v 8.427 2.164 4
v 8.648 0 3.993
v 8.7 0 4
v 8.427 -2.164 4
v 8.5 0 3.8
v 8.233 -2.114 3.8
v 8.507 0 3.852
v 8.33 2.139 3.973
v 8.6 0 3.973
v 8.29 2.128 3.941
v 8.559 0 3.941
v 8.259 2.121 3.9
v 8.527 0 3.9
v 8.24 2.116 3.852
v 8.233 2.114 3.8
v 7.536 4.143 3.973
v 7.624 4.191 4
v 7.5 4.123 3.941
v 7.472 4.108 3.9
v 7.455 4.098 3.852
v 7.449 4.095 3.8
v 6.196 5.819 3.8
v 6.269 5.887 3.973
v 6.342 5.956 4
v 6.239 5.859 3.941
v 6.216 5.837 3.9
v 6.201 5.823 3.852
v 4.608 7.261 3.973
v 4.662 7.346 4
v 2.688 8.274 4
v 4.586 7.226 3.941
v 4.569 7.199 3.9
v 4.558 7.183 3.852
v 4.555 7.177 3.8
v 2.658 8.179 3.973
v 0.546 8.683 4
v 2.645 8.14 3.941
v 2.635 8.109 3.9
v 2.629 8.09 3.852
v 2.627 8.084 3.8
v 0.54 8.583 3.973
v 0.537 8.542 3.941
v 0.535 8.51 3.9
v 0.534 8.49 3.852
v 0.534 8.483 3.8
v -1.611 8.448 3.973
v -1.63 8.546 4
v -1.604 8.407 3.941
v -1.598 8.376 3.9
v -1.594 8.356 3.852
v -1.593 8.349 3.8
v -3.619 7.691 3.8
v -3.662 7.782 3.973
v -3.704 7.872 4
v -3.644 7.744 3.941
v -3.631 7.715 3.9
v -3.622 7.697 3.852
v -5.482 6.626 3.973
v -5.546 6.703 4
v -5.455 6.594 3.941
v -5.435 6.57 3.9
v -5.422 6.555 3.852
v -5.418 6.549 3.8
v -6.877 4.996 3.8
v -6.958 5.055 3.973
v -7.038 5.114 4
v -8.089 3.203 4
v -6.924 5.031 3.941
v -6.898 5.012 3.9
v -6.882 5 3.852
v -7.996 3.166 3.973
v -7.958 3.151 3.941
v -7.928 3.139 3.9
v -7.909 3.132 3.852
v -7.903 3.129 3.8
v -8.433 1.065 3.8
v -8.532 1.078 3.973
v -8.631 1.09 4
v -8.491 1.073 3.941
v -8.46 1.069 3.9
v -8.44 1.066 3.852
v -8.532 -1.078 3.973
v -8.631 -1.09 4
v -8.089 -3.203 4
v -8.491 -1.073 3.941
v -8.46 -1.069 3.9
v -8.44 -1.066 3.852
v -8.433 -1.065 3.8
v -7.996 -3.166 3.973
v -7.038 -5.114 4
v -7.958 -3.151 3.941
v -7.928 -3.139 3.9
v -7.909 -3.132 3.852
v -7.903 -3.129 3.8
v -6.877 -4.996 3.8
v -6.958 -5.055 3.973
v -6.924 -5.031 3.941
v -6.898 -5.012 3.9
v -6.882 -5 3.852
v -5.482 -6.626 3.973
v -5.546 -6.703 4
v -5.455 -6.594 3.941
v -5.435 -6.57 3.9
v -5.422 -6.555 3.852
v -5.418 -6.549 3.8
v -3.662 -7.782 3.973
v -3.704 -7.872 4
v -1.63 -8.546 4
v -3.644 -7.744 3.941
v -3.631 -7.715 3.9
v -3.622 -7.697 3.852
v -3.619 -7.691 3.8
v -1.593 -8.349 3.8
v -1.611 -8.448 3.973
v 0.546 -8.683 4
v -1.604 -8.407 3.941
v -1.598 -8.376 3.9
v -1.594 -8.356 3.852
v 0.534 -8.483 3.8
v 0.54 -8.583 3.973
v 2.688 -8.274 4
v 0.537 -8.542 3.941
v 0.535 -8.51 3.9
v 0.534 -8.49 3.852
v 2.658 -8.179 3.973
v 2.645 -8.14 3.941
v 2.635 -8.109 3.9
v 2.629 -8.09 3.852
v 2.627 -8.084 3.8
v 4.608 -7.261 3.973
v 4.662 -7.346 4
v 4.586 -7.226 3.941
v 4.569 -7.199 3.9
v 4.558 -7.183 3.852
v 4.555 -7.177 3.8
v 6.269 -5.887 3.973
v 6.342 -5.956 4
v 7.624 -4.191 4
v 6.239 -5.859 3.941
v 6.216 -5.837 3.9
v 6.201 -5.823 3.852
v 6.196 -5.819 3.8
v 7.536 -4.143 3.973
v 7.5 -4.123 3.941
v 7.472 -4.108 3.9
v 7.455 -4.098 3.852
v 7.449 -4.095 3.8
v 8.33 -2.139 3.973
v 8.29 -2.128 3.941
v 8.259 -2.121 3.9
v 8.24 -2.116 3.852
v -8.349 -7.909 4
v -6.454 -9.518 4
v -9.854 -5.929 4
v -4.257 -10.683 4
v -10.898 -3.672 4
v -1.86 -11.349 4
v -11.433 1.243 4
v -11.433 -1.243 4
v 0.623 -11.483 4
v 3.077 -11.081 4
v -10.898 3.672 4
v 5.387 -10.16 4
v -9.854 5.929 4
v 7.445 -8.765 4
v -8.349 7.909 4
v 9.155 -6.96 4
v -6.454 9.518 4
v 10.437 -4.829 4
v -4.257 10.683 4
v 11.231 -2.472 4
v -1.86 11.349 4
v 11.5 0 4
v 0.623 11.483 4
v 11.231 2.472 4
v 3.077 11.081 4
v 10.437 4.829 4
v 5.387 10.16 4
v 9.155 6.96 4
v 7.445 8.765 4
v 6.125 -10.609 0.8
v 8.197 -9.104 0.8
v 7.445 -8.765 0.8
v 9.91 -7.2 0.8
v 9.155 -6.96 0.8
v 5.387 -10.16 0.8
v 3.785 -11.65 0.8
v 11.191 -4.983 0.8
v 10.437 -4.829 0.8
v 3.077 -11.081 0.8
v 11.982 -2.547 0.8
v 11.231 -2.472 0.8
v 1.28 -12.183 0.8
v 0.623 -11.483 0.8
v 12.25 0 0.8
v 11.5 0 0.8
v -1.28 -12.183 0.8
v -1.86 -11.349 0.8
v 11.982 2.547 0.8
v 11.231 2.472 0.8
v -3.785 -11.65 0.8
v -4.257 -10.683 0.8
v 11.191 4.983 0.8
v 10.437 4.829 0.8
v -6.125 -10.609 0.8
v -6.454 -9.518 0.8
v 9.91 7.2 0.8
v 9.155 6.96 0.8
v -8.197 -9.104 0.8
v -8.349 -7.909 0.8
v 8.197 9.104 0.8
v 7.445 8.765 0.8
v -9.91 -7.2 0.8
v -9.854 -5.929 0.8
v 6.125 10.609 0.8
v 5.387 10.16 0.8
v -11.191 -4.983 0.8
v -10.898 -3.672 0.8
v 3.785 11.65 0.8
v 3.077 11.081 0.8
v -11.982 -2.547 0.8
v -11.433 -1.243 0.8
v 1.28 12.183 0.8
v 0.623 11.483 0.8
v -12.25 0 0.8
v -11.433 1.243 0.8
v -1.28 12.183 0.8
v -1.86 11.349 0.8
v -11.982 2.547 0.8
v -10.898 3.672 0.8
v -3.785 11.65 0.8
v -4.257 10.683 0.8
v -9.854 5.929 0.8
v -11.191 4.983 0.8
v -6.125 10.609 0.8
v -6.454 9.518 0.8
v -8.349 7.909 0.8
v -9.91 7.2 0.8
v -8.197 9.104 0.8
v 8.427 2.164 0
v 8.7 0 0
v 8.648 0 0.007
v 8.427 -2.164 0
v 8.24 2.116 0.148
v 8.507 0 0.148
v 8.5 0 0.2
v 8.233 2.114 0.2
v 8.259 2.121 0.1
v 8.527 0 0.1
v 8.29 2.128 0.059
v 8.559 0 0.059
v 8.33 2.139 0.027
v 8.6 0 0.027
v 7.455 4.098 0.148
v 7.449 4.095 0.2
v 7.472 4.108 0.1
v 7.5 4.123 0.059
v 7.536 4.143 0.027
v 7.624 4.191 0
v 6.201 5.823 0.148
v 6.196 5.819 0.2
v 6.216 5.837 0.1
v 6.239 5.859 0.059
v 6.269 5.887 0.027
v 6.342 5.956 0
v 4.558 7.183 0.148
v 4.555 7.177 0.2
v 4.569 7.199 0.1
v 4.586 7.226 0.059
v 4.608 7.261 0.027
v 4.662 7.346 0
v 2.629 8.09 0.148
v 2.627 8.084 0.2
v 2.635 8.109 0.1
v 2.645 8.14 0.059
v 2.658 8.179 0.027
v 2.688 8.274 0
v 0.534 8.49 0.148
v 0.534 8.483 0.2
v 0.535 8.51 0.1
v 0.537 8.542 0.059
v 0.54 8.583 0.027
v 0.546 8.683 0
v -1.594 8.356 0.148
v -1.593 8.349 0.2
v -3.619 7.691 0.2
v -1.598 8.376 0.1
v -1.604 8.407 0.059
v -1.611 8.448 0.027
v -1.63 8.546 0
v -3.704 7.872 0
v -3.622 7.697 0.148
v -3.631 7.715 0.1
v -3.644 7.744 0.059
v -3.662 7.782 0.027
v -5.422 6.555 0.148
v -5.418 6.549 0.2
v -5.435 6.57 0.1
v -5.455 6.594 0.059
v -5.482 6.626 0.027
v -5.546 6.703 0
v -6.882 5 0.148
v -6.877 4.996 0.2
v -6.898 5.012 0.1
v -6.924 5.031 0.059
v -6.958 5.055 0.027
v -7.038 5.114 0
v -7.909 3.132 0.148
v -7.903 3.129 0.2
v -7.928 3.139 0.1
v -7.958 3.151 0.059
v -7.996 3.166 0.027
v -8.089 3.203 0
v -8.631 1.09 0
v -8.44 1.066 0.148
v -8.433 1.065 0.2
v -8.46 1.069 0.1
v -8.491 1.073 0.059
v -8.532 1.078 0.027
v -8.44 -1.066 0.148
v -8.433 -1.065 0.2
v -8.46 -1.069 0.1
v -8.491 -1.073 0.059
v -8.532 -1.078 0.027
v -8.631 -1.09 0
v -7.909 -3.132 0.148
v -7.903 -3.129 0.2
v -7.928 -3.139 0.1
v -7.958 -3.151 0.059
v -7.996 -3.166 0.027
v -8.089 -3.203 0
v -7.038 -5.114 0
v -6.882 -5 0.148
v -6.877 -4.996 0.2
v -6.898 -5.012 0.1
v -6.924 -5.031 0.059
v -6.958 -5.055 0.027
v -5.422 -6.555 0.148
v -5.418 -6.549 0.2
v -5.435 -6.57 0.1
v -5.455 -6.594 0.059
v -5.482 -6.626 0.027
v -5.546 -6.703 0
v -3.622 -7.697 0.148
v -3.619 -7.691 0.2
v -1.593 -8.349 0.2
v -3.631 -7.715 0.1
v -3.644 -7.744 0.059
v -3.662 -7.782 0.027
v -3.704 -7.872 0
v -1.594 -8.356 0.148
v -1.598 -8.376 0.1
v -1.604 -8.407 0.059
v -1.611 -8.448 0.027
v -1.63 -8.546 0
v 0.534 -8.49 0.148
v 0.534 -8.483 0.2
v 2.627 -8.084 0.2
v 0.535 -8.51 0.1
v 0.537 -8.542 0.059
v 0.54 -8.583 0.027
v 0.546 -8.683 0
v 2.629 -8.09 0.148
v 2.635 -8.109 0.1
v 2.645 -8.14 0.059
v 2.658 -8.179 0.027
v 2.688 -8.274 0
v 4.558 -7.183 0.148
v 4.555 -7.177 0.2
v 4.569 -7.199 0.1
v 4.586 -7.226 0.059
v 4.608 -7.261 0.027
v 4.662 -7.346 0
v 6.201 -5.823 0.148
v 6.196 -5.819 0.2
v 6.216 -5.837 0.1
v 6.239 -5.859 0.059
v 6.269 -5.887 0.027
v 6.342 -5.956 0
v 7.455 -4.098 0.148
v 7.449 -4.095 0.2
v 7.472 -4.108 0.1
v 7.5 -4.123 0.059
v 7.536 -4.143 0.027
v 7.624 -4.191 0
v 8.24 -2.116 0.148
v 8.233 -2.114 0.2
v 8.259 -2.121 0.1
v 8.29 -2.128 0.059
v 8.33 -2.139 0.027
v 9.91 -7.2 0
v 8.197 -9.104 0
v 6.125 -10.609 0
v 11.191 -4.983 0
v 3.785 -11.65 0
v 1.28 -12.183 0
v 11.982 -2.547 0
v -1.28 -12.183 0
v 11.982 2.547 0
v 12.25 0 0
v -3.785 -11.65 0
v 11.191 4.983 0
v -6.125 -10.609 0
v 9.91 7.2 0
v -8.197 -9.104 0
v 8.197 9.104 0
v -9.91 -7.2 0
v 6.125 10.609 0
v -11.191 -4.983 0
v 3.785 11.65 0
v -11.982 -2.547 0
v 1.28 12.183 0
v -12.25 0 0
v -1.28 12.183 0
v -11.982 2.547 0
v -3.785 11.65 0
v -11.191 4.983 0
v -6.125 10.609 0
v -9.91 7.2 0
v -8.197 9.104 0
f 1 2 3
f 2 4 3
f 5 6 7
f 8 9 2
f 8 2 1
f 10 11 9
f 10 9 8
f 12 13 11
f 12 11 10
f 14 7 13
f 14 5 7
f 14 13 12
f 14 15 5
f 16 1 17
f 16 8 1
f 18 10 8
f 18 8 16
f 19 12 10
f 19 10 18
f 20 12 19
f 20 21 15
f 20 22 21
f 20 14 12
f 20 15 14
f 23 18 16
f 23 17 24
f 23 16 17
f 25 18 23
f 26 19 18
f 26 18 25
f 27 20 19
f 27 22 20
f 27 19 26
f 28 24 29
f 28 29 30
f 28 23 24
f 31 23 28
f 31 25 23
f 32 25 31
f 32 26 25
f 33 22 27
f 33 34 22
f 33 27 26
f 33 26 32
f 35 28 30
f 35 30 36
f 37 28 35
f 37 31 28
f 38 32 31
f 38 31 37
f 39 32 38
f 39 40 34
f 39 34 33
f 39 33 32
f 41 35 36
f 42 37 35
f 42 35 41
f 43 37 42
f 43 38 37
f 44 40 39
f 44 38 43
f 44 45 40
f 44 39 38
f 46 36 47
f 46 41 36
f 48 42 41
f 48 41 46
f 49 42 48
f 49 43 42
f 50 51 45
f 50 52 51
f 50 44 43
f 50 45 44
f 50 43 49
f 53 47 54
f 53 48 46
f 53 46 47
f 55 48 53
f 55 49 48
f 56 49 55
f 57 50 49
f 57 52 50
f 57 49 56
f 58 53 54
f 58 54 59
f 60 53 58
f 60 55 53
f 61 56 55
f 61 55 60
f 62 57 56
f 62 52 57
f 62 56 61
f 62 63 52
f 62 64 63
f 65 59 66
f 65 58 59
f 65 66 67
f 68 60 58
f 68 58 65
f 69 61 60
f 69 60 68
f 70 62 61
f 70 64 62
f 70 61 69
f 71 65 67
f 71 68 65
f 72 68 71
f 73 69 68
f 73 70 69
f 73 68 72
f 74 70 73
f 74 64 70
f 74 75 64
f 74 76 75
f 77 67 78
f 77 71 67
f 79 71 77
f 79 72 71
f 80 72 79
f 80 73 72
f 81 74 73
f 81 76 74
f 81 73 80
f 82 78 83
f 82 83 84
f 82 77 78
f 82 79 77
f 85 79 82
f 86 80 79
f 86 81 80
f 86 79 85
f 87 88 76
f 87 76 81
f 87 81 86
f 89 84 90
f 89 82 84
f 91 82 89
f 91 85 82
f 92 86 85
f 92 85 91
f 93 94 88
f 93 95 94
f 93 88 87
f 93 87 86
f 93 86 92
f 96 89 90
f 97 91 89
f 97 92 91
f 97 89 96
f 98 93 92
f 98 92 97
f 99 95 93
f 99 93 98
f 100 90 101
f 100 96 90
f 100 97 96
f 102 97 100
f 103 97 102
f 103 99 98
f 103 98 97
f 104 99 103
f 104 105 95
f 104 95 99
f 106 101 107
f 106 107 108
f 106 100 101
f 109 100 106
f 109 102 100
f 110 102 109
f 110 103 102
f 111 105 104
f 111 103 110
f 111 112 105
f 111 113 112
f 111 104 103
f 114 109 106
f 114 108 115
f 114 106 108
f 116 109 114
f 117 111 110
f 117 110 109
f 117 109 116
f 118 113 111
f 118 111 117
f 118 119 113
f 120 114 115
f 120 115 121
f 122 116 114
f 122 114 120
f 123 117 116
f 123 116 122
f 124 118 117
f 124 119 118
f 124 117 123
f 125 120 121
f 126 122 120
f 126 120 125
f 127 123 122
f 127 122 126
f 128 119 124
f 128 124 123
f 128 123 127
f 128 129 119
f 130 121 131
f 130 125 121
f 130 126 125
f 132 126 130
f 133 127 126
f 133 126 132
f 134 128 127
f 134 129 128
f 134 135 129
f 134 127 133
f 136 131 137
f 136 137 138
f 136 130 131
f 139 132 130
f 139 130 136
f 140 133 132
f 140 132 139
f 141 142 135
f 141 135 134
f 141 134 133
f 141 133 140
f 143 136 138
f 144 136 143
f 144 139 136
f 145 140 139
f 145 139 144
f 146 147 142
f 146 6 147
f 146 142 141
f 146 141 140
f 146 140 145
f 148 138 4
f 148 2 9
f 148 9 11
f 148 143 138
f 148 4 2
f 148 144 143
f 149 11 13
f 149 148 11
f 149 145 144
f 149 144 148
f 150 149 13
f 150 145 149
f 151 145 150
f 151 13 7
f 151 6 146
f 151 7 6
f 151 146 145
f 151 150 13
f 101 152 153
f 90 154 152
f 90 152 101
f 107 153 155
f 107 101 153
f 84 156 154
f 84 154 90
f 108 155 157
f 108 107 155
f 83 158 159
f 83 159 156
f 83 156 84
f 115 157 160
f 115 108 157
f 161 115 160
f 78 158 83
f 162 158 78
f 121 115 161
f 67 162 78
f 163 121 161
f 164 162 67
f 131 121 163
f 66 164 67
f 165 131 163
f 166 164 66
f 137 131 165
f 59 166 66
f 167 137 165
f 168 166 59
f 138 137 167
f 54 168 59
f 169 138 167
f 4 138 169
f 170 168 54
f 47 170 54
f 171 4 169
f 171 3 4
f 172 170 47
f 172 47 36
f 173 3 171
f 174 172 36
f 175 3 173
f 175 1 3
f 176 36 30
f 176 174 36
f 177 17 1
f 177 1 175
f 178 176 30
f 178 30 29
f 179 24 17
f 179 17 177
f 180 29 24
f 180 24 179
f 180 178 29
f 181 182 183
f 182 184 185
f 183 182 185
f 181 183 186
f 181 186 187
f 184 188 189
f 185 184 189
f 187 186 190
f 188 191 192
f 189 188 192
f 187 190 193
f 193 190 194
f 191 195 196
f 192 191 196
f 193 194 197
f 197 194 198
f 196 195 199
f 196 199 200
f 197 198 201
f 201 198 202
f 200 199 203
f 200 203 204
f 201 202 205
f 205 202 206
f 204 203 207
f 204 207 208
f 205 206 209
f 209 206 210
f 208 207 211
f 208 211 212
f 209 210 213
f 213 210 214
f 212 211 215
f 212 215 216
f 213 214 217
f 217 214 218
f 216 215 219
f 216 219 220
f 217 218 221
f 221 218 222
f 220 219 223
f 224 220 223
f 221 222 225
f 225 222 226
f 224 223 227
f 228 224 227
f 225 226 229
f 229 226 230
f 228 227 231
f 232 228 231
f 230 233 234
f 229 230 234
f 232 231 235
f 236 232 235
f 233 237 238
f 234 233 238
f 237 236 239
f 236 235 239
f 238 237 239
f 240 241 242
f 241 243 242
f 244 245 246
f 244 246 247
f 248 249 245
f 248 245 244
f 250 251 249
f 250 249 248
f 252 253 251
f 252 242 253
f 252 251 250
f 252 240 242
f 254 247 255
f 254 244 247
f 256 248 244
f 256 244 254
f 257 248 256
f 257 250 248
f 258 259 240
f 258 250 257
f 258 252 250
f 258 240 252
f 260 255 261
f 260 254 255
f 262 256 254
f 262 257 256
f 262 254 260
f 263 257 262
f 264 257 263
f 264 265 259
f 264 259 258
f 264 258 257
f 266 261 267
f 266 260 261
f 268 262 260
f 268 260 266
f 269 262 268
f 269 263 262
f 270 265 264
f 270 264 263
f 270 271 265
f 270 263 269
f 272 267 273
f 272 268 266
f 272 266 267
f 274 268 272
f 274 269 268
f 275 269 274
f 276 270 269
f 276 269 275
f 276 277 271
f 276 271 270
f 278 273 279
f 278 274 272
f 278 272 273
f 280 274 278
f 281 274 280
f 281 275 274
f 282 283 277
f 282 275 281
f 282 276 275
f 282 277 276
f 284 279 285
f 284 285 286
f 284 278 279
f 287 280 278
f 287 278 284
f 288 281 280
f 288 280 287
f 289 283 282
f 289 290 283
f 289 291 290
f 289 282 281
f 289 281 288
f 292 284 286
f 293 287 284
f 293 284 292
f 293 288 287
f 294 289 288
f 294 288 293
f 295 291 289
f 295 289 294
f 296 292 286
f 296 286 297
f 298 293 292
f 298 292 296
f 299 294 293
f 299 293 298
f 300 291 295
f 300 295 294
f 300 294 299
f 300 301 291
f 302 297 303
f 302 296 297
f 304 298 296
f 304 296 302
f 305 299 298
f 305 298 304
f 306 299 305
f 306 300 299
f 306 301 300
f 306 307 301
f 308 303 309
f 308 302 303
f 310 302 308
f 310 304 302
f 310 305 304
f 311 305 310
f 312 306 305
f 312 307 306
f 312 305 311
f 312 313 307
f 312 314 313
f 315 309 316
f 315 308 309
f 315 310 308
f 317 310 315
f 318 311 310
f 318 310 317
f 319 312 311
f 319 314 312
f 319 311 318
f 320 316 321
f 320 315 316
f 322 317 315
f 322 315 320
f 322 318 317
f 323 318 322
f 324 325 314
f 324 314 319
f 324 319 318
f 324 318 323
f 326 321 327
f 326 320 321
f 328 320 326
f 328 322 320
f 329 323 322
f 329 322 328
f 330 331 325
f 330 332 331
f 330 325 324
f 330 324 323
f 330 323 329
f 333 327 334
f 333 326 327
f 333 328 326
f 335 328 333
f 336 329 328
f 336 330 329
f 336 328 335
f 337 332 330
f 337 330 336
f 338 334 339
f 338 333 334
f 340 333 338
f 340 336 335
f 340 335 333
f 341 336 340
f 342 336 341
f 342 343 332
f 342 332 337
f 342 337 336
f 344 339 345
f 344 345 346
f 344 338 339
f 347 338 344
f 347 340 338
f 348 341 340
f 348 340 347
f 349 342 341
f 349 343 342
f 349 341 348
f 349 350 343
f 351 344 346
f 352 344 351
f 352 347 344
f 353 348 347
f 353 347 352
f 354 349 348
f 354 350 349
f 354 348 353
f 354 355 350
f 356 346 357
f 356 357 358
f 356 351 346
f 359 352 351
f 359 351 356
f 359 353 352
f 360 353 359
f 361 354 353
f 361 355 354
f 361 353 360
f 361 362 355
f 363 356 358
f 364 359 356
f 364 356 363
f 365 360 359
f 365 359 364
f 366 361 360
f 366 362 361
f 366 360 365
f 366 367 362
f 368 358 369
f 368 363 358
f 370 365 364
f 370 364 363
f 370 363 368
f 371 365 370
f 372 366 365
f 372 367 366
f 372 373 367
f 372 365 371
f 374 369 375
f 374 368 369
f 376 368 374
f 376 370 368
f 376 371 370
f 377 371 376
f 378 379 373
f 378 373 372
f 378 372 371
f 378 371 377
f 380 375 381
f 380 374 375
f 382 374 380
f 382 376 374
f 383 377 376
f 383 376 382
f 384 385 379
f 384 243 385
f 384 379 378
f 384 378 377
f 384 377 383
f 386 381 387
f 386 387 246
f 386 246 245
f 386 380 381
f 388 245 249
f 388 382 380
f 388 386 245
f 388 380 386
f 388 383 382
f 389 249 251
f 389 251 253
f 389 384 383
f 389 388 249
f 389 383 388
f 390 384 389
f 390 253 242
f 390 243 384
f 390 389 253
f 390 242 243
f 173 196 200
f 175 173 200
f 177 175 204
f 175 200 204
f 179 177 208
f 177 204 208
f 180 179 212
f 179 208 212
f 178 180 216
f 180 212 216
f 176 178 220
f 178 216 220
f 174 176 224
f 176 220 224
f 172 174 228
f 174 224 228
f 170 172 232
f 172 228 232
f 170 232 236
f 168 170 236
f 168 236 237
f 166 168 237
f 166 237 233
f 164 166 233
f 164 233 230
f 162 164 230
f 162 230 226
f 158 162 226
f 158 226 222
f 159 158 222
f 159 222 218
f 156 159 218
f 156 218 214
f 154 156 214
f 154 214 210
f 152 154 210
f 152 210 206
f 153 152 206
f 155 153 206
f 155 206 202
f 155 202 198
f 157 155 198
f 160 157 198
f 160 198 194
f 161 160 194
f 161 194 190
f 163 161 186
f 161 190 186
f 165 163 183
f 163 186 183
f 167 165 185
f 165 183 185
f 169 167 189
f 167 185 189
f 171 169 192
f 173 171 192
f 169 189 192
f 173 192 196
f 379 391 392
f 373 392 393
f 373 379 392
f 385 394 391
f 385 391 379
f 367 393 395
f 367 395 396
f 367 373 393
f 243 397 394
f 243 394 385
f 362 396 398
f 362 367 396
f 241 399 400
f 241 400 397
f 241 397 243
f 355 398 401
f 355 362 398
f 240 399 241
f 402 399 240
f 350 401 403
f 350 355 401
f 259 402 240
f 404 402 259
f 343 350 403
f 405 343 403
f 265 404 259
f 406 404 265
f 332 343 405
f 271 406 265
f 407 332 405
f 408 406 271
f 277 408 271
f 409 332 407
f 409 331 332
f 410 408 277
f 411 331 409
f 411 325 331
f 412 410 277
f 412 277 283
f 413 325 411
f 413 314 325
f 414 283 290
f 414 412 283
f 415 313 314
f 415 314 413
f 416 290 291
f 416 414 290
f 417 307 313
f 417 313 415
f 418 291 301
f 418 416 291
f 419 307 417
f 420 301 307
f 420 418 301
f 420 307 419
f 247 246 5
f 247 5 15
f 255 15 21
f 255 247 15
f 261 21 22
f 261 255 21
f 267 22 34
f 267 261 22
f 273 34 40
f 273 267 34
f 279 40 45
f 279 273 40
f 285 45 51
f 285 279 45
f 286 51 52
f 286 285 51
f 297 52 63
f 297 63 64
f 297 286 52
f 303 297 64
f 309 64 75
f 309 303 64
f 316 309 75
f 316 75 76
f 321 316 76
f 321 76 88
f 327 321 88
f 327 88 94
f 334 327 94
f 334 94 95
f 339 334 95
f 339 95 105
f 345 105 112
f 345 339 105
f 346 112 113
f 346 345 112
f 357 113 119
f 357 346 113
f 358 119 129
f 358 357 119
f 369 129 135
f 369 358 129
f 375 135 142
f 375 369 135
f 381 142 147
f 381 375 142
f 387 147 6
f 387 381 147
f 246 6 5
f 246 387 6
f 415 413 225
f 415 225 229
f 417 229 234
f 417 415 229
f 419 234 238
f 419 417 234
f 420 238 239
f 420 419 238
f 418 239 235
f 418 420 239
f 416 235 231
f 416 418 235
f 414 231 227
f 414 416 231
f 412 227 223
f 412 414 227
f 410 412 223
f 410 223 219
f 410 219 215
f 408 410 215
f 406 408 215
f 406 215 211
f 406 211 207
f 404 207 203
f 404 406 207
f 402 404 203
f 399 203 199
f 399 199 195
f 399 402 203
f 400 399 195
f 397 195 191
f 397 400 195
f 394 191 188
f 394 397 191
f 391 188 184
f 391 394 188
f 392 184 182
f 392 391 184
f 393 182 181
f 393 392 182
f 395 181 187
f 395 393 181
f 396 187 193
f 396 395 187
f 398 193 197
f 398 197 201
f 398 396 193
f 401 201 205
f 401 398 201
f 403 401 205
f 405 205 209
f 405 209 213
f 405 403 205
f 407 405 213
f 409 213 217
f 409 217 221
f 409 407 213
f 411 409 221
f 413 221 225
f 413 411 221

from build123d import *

# Parameters (mm, degrees)
SKETCH_1_R      = 11.5
SKETCH_1_R_2    = 8.5
EXTRUDE_1_DEPTH = 4
SKETCH_2_R      = 12.25
SKETCH_2_R_2    = 11.5
EXTRUDE_2_DEPTH = 0.8
FILLET_1_R      = 0.2


with BuildPart() as part:
    # ｽｹｯﾁ1 → 押し出し-薄板1 (new body)
    with BuildSketch(Plane.XY):
        Circle(SKETCH_1_R)
        Circle(SKETCH_1_R_2, mode=Mode.SUBTRACT)
    extrude(amount=EXTRUDE_1_DEPTH)

    # ｽｹｯﾁ2 → 押し出し-薄板2 (add)
    with BuildSketch(Plane(origin=(0, 0, 0), x_dir=(-1, 0, 0), z_dir=(0, 0, -1))):
        Circle(SKETCH_2_R)
        Circle(SKETCH_2_R_2, mode=Mode.SUBTRACT)
    extrude(amount=-EXTRUDE_2_DEPTH)

    # ﾌｨﾚｯﾄ1
    fillet_1_edges = [part.edges().sort_by_distance(p)[0] for p in [
        (-8.5, 0, 0),
        (-8.5, 0, 4),
    ]]
    fillet(fillet_1_edges, radius=FILLET_1_R)


solid = part.part
